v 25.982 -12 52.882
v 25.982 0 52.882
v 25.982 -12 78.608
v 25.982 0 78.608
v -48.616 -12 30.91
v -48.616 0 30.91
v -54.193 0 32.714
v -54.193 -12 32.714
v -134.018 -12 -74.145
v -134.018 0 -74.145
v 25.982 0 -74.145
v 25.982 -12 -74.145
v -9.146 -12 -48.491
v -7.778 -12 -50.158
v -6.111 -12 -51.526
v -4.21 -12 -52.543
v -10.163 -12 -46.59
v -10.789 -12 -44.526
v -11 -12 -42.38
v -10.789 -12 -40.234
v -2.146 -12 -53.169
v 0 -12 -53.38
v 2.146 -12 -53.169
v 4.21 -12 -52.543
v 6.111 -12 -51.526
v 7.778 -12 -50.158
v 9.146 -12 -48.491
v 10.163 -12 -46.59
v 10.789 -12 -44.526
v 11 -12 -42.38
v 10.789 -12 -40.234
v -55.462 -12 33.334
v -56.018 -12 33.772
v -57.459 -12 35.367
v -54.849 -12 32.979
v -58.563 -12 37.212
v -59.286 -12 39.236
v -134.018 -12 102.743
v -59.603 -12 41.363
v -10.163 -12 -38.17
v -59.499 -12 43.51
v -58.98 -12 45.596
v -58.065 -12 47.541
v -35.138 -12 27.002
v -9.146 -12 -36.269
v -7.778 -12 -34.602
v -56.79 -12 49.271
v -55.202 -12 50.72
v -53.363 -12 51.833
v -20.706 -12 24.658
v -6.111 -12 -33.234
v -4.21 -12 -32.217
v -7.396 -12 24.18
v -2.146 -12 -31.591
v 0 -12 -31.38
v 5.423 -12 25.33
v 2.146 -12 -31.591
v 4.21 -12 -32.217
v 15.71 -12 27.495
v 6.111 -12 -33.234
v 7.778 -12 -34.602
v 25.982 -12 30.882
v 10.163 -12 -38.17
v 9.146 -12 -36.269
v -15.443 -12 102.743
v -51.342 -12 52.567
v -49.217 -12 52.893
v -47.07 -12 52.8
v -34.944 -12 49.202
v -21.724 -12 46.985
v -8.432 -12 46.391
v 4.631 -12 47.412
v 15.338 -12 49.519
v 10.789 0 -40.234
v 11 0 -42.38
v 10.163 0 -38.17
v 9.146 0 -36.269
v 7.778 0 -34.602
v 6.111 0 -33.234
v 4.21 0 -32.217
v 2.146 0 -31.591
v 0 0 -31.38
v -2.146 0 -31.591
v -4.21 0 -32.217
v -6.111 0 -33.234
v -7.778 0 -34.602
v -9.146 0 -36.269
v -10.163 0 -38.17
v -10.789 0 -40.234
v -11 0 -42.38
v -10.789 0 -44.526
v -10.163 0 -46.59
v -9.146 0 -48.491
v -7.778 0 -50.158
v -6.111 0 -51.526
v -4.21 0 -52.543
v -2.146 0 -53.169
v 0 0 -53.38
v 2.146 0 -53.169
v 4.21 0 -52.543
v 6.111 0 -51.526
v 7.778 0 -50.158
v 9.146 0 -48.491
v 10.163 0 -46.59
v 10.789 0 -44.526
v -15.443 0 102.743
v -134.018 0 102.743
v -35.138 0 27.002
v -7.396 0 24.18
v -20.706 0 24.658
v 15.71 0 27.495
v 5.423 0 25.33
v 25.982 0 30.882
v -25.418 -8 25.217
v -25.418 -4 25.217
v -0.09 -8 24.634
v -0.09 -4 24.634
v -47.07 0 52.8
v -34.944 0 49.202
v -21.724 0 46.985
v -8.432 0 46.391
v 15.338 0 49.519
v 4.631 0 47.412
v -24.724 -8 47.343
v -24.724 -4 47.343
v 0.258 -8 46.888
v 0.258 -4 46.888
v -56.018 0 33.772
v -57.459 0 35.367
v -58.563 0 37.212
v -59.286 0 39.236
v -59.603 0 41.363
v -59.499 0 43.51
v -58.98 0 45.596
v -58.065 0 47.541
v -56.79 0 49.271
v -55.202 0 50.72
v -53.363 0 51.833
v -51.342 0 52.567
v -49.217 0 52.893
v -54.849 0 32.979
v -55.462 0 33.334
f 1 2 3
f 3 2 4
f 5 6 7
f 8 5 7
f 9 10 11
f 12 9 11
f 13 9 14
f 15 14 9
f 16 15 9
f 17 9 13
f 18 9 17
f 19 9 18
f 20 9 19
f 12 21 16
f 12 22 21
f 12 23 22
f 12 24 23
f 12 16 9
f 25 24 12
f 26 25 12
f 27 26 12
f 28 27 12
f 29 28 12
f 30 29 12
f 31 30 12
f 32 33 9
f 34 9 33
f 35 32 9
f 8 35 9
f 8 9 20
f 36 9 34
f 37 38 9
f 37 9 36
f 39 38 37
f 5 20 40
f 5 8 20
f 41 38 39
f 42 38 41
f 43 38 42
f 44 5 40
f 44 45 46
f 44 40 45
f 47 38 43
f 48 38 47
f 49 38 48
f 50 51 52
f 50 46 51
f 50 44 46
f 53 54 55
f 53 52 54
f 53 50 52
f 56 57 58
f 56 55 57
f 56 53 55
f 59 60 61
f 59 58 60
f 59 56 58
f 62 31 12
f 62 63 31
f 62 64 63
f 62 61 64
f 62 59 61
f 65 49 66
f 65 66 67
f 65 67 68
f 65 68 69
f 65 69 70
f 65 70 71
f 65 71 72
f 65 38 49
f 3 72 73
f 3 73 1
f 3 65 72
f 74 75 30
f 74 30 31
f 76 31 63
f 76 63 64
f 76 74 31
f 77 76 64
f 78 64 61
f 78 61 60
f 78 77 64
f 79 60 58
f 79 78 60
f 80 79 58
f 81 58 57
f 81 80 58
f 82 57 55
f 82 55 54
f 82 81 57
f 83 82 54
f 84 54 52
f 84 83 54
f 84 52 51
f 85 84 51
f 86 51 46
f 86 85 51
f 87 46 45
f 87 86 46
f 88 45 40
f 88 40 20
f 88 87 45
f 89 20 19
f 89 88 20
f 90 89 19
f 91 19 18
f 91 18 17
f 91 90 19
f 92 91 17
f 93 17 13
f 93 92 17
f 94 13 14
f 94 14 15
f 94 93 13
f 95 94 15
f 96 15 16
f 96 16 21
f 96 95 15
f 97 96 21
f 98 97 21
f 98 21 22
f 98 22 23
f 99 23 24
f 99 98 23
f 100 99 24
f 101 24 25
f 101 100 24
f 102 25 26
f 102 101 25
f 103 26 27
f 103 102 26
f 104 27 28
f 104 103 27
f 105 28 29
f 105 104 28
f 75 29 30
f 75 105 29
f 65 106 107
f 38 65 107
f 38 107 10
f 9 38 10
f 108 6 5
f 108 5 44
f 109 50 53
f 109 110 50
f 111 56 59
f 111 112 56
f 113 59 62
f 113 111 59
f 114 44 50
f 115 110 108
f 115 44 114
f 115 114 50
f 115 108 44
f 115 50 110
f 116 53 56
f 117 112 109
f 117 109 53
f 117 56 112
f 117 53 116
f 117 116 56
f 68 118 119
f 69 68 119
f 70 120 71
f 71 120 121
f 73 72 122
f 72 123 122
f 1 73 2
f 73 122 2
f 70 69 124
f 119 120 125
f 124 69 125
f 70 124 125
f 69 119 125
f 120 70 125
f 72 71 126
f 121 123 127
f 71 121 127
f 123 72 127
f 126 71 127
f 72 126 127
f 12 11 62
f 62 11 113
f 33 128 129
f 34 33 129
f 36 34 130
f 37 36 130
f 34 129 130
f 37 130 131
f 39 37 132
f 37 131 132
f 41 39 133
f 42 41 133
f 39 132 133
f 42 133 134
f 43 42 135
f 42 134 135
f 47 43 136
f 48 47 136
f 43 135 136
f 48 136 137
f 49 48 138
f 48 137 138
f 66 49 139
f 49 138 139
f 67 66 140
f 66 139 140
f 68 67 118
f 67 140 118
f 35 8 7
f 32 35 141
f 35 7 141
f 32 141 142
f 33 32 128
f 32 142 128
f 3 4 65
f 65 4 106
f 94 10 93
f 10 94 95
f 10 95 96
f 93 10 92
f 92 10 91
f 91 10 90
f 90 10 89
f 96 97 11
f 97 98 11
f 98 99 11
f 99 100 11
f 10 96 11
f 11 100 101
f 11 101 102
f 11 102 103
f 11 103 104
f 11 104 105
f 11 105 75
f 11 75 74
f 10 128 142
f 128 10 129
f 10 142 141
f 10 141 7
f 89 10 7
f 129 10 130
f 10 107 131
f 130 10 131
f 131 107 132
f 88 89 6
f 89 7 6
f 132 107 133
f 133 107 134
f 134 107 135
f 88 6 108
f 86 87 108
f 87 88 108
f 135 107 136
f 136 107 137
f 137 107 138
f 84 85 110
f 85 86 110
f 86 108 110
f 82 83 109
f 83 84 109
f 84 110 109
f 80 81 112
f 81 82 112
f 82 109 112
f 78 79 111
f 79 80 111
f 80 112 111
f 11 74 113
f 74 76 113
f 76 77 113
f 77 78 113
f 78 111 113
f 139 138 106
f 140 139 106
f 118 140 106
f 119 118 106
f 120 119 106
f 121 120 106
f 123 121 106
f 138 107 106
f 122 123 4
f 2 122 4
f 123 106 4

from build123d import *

# Parameters (mm, degrees)
F0_R     = 11
F1_DEPTH = 12


with BuildPart() as f1:
    # F0 (on Front) → F1 (new body)
    with BuildSketch(Plane.XZ):
        with BuildLine():
            Line((25.981579, 78.608206), (-15.442509, 102.743387))
            Line((-15.442509, 102.743387), (-134.018421, 102.743387))
            Line((-134.018421, 102.743387), (-134.018421, -74.145091))
            Line((-134.018421, -74.145091), (25.981579, -74.145091))
            Line((25.981579, -74.145091), (25.981579, 30.882375))
            add(Edge.make_bspline(
                [(-48.616274, 30.909721), (-26.945135, 23.237184), (0, 20.642917), (25.981579, 30.882375)],
                knots=[0, 0, 0, 0, 74.597858, 74.597858, 74.597858, 74.597858], degree=3))
            Line((-48.616274, 30.909721), (-54.192658, 32.713946))
            ThreePointArc((-54.192658, 32.713946), (-55.161698, 33.145772), (-56.017817, 33.772328))
            ThreePointArc((-56.017817, 33.772328), (-58.570506, 46.590881), (-47.069505, 52.800428))
            add(Edge.make_bspline(
                [(-47.069505, 52.800428), (-26.67203, 45.323465), (0.517313, 43.181155), (25.981579, 52.882375)],
                knots=[1.854694, 1.854694, 1.854694, 1.854694, 74.59953, 74.59953, 74.59953, 74.59953], degree=3))
            Line((25.981579, 52.882375), (25.981579, 78.608206))
        make_face()
        with Locations((0, -42.380005)):
            Circle(F0_R, mode=Mode.SUBTRACT)
    extrude(amount=F1_DEPTH)


solid = f1.part
